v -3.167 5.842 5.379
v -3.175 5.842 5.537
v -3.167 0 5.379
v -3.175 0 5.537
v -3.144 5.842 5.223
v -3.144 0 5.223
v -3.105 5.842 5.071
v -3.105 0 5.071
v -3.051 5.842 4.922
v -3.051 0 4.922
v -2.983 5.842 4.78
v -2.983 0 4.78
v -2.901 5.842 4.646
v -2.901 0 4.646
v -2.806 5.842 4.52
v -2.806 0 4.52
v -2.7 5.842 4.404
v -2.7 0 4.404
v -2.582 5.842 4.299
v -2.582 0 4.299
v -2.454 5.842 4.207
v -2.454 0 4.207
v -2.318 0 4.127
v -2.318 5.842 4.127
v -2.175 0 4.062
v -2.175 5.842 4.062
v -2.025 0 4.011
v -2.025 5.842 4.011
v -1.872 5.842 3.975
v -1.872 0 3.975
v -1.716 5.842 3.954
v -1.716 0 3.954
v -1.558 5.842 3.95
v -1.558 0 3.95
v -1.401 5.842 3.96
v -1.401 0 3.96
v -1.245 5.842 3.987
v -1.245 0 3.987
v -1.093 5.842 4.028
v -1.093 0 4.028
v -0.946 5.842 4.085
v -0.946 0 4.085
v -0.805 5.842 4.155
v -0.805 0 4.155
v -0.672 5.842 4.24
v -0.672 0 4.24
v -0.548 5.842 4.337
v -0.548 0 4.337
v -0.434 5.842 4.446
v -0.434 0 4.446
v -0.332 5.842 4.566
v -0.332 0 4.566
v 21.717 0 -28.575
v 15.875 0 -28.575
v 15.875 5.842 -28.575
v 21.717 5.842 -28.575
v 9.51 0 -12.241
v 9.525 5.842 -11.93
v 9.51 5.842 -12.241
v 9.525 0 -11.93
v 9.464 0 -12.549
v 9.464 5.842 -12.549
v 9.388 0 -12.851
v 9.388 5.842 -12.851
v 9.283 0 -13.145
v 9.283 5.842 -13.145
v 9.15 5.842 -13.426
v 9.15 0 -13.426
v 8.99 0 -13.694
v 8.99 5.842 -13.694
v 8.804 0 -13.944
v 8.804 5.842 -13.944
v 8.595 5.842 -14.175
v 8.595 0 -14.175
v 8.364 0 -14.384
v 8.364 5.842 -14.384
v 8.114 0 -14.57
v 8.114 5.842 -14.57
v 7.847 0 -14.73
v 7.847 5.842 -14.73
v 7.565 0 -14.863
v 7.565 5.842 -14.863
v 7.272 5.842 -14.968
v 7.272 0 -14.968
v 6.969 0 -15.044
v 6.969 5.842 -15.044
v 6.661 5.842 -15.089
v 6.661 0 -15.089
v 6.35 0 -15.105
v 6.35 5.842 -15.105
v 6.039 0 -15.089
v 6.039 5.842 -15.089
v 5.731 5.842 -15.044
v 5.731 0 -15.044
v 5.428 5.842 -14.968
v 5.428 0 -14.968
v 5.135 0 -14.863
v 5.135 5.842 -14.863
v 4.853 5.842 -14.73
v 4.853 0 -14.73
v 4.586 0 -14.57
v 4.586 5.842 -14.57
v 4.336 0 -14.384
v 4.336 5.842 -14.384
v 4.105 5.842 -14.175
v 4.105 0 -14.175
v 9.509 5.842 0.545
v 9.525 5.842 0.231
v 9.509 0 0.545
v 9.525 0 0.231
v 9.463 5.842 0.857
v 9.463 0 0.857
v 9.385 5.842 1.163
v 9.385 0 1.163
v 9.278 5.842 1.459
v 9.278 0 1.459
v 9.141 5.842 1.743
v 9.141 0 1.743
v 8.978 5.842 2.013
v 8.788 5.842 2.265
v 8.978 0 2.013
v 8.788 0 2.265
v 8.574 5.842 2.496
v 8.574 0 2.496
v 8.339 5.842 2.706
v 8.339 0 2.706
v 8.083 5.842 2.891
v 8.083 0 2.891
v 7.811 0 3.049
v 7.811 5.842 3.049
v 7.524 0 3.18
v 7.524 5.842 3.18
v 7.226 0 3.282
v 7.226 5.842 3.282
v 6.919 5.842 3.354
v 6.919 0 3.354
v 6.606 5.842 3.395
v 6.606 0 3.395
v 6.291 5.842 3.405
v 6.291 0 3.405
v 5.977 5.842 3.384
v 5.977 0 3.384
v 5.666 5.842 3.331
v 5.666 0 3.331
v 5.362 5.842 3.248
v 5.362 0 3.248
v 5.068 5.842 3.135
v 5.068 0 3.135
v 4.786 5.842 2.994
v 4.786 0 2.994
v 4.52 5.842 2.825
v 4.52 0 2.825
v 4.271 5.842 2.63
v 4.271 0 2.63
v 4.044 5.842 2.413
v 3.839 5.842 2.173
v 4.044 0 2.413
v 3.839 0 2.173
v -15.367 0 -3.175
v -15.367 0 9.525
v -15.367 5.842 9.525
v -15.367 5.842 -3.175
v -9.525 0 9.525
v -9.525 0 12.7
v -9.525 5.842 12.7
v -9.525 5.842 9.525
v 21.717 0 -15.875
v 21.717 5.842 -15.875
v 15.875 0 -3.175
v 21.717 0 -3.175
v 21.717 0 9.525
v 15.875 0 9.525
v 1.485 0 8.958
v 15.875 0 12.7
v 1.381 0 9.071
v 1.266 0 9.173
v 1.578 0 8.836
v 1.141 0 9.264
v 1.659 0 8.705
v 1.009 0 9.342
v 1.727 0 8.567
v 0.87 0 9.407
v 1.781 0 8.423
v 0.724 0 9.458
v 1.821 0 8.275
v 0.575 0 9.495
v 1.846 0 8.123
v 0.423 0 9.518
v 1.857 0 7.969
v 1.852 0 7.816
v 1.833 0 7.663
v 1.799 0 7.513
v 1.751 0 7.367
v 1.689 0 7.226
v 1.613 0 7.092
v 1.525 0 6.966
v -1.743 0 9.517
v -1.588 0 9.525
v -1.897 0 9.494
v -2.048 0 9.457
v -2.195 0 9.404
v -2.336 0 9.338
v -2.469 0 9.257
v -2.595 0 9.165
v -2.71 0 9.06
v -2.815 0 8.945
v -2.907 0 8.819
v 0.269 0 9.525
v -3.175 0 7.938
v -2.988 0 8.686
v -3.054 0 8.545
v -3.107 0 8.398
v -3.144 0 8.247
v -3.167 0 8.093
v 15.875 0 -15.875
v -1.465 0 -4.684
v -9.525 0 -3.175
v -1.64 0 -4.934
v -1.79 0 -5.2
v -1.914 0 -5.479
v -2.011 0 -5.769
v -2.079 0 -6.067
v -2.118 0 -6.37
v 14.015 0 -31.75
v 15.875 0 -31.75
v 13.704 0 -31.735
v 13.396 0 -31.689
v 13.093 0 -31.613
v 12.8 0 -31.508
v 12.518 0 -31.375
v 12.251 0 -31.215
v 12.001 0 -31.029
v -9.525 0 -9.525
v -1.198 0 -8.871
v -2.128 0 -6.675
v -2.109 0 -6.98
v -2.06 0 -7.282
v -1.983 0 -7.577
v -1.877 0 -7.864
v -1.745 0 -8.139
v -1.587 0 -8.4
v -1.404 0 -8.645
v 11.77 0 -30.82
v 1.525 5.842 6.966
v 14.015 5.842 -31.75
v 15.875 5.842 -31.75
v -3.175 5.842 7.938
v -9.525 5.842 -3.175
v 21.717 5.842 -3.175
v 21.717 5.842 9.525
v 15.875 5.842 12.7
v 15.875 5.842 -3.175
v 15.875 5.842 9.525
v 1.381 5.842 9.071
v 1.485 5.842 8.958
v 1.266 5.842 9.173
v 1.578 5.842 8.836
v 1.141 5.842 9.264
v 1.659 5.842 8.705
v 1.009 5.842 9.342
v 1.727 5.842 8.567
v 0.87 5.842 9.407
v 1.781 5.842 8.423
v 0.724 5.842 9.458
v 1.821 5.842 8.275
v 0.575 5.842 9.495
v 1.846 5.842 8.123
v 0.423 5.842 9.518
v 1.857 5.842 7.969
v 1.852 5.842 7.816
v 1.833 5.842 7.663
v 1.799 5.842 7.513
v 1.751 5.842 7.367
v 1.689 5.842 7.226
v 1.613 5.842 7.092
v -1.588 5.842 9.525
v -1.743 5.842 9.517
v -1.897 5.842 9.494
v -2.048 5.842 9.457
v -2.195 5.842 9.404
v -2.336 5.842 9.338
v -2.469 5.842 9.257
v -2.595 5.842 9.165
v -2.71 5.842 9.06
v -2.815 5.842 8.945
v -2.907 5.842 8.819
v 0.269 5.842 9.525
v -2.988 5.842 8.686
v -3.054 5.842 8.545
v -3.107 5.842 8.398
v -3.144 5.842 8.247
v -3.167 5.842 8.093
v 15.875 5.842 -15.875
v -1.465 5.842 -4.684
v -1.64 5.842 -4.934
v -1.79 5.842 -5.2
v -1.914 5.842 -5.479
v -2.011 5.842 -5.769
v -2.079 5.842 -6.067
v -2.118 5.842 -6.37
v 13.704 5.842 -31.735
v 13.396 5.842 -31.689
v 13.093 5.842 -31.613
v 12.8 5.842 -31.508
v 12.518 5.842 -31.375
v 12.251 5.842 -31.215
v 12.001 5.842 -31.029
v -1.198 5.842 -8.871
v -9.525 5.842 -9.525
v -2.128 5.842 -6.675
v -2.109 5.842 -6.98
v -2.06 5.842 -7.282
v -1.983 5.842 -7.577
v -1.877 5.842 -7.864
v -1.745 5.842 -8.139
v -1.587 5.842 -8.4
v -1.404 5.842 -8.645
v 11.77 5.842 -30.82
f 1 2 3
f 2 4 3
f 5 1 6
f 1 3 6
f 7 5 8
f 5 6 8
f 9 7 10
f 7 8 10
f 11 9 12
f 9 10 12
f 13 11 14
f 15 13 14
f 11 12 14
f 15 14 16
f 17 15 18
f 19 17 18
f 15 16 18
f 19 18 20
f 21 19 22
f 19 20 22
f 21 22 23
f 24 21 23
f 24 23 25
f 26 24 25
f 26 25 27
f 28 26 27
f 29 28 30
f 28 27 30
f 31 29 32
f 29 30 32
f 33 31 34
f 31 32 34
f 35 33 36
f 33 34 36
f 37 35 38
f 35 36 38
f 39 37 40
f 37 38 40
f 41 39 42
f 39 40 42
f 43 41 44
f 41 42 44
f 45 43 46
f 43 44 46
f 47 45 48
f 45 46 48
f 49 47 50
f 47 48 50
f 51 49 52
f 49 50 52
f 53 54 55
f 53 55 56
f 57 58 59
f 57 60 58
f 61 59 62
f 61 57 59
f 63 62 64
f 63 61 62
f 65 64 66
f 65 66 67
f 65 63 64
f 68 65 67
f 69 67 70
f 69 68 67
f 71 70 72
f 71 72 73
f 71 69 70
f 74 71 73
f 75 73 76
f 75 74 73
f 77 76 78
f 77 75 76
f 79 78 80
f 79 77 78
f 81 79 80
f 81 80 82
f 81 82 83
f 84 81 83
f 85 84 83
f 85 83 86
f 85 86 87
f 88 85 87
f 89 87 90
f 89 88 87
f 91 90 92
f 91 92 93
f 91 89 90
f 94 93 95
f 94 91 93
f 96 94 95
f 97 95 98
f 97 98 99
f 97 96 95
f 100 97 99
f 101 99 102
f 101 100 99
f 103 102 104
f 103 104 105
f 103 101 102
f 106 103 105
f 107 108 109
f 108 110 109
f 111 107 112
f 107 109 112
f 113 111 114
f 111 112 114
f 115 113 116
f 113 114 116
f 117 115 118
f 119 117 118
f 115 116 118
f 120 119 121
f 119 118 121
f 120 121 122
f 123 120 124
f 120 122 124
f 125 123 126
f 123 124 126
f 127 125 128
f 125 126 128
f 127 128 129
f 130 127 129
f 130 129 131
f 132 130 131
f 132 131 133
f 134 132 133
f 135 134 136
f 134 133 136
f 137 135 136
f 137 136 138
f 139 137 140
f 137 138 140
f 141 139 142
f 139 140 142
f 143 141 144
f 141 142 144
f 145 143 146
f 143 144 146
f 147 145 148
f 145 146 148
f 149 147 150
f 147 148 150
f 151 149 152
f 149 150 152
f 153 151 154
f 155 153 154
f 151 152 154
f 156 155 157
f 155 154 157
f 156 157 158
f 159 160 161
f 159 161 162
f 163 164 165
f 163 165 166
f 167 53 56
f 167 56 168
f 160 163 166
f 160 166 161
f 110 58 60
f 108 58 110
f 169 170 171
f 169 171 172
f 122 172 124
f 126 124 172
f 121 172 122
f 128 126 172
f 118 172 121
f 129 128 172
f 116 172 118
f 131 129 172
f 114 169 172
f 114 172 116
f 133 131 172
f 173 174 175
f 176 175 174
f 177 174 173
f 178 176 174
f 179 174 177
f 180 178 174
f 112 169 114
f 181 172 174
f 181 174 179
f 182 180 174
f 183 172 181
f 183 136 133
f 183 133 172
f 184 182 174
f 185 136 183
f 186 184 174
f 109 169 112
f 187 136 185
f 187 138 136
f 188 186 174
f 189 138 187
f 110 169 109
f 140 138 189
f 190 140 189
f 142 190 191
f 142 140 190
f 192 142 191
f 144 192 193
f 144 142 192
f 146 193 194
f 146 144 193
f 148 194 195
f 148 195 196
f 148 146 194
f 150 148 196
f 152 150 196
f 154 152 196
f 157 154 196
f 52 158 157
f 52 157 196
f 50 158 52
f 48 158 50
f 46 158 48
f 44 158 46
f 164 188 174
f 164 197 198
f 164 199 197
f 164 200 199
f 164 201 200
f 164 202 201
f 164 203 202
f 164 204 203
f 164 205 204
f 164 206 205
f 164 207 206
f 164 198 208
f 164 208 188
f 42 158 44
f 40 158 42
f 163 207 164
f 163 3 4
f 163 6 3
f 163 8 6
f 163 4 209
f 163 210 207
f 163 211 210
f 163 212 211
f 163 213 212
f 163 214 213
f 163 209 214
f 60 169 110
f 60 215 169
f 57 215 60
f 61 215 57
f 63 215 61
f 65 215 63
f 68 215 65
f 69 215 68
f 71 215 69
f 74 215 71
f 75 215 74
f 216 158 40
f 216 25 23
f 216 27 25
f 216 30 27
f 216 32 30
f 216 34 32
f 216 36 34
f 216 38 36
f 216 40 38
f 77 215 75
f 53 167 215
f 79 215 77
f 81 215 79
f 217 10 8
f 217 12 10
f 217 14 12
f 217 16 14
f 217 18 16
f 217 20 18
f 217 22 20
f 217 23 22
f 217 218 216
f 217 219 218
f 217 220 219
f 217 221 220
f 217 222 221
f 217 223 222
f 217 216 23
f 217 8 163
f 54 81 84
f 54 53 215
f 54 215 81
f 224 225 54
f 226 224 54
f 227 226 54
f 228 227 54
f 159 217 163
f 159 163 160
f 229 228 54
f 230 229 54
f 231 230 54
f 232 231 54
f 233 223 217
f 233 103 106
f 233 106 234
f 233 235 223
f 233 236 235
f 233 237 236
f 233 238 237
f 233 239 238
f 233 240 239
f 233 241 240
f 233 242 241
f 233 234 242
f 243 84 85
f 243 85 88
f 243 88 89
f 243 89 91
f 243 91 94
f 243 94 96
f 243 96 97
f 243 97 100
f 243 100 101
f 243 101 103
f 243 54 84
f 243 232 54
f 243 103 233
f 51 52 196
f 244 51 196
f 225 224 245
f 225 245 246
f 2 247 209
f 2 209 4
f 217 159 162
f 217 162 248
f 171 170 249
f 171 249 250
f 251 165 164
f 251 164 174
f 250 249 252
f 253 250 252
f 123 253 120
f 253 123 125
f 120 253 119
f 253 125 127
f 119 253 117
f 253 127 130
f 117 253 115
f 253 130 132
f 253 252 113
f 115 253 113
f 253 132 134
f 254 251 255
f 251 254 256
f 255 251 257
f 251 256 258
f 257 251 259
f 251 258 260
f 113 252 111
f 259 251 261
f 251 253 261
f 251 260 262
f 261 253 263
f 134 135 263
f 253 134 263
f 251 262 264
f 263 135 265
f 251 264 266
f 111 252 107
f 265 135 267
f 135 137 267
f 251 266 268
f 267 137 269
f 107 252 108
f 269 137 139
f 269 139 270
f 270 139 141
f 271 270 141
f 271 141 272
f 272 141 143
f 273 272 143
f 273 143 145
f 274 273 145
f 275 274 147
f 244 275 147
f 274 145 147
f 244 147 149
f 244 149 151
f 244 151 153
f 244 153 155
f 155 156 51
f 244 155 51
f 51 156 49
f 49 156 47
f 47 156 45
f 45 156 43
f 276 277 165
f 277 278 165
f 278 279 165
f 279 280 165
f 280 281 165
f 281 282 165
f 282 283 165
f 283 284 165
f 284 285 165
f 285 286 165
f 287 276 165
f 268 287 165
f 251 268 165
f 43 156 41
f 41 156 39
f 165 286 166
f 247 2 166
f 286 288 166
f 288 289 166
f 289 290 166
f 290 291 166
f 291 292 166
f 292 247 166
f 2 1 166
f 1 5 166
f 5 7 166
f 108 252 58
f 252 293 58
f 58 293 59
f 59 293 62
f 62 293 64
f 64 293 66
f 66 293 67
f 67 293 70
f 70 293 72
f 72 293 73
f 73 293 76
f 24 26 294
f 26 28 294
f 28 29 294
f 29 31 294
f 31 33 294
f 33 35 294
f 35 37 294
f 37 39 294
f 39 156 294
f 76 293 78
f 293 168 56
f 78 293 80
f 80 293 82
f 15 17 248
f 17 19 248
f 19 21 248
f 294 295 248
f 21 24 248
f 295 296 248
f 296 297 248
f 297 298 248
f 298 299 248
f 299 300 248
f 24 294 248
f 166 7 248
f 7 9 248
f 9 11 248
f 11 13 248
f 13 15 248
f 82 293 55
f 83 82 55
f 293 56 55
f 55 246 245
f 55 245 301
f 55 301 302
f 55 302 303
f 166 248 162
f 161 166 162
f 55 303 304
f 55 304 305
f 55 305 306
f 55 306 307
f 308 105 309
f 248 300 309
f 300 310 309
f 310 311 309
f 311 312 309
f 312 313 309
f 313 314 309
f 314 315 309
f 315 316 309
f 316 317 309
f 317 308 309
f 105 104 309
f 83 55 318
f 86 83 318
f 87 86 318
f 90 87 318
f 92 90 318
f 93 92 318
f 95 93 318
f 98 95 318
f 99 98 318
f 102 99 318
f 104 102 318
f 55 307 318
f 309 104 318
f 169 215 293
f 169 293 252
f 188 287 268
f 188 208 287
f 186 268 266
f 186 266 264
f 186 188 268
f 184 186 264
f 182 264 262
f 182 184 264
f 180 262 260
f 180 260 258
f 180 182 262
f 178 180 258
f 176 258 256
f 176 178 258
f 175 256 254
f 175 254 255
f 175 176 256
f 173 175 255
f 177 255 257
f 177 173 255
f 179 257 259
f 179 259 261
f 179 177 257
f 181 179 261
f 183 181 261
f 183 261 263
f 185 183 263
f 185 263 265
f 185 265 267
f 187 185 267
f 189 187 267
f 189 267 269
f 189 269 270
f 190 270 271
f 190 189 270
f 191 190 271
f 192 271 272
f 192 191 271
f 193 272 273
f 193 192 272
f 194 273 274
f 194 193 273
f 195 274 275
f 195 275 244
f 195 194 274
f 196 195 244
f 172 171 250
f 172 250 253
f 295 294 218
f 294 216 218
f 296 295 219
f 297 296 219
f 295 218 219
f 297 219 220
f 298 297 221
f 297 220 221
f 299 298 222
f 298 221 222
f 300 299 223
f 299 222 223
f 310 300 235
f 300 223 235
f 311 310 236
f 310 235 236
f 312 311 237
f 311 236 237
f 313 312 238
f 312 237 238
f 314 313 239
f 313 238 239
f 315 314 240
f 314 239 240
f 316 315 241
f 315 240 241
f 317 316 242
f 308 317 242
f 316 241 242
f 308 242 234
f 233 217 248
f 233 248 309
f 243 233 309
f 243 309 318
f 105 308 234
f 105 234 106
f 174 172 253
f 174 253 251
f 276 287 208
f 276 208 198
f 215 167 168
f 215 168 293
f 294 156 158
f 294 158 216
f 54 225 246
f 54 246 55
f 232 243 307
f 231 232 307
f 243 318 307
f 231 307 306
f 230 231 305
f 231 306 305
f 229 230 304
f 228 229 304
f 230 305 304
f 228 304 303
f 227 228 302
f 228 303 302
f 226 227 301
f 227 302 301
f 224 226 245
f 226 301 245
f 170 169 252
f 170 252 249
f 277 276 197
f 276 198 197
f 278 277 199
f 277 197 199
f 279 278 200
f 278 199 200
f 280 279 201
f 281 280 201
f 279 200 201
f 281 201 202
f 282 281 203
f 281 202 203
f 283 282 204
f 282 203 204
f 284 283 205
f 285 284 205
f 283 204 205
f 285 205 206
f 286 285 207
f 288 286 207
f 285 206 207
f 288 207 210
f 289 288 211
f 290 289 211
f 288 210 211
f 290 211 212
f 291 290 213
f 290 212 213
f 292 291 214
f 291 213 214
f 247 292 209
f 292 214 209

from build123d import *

# Parameters (mm, degrees)
BOSS_EXTRUDE1_DEPTH = 5.842
CUT_EXTRUDE1_DEPTH  = 39.907834083
FILLET1_R           = 3.175
FILLET2_R           = 1.5875
FILLET3_R           = 3.175
SKETCH3_W           = 25.4
SKETCH3_H           = 3.175
CUT_EXTRUDE2_DEPTH  = 39.907834083


with BuildPart() as part:
    # Sketch1 → Boss-Extrude1 (new body)
    with BuildSketch(Plane(origin=(0, 0, 0), x_dir=(1, 0, 0), z_dir=(0, 1, 0))):
        Polygon((15.875, -15.875), (-9.525, -15.875), (-9.525, -9.525), (-15.367, -9.525), (-15.367, 3.175), (-9.525, 3.175), (-9.525, 9.525), (12.7, 31.75), (15.875, 31.75), (15.875, 28.575), (21.717, 28.575), (21.717, 15.875), (15.875, 15.875), (15.875, 3.175), (21.717, 3.175), (21.717, -9.525), (15.875, -9.525), align=None)
    extrude(amount=BOSS_EXTRUDE1_DEPTH)

    # Sketch2 → Cut-Extrude1 (cut, through all)
    with BuildSketch(Plane(origin=(0, 5.842, 0), x_dir=(1, 0, 0), z_dir=(0, 1, 0))):
        Polygon((-3.175, 6.894743879), (9.525, 19.594743879), (9.525, -9.525), align=None)
        Polygon((-3.175, -0.889537058), (3.504177225, -9.525), (-3.175, -9.525), align=None)
    extrude(amount=-CUT_EXTRUDE1_DEPTH, mode=Mode.SUBTRACT)

    # Fillet1
    fillet1_edges = [part.edges().sort_by_distance(p)[0] for p in [
        (12.7, 2.921, -31.75),
    ]]
    fillet(fillet1_edges, radius=FILLET1_R)

    # Fillet2
    fillet2_edges = [part.edges().sort_by_distance(p)[0] for p in [
        (-3.175, 2.921, 9.525),
        (-3.175, 2.921, 0.889537058),
        (3.504177225, 2.921, 9.525),
    ]]
    fillet(fillet2_edges, radius=FILLET2_R)

    # Fillet3
    fillet3_edges = [part.edges().sort_by_distance(p)[0] for p in [
        (9.525, 2.921, 9.525),
        (-3.175, 2.921, -6.894743879),
        (9.525, 2.921, -19.594743879),
    ]]
    fillet(fillet3_edges, radius=FILLET3_R)

    # Sketch3 → Cut-Extrude2 (cut, through all)
    with BuildSketch(Plane(origin=(0, 5.842, 0), x_dir=(1, 0, 0), z_dir=(0, 1, 0))):
        with Locations((3.175, -14.2875)):
            Rectangle(SKETCH3_W, SKETCH3_H)
    extrude(amount=-CUT_EXTRUDE2_DEPTH, mode=Mode.SUBTRACT)


solid = part.part
